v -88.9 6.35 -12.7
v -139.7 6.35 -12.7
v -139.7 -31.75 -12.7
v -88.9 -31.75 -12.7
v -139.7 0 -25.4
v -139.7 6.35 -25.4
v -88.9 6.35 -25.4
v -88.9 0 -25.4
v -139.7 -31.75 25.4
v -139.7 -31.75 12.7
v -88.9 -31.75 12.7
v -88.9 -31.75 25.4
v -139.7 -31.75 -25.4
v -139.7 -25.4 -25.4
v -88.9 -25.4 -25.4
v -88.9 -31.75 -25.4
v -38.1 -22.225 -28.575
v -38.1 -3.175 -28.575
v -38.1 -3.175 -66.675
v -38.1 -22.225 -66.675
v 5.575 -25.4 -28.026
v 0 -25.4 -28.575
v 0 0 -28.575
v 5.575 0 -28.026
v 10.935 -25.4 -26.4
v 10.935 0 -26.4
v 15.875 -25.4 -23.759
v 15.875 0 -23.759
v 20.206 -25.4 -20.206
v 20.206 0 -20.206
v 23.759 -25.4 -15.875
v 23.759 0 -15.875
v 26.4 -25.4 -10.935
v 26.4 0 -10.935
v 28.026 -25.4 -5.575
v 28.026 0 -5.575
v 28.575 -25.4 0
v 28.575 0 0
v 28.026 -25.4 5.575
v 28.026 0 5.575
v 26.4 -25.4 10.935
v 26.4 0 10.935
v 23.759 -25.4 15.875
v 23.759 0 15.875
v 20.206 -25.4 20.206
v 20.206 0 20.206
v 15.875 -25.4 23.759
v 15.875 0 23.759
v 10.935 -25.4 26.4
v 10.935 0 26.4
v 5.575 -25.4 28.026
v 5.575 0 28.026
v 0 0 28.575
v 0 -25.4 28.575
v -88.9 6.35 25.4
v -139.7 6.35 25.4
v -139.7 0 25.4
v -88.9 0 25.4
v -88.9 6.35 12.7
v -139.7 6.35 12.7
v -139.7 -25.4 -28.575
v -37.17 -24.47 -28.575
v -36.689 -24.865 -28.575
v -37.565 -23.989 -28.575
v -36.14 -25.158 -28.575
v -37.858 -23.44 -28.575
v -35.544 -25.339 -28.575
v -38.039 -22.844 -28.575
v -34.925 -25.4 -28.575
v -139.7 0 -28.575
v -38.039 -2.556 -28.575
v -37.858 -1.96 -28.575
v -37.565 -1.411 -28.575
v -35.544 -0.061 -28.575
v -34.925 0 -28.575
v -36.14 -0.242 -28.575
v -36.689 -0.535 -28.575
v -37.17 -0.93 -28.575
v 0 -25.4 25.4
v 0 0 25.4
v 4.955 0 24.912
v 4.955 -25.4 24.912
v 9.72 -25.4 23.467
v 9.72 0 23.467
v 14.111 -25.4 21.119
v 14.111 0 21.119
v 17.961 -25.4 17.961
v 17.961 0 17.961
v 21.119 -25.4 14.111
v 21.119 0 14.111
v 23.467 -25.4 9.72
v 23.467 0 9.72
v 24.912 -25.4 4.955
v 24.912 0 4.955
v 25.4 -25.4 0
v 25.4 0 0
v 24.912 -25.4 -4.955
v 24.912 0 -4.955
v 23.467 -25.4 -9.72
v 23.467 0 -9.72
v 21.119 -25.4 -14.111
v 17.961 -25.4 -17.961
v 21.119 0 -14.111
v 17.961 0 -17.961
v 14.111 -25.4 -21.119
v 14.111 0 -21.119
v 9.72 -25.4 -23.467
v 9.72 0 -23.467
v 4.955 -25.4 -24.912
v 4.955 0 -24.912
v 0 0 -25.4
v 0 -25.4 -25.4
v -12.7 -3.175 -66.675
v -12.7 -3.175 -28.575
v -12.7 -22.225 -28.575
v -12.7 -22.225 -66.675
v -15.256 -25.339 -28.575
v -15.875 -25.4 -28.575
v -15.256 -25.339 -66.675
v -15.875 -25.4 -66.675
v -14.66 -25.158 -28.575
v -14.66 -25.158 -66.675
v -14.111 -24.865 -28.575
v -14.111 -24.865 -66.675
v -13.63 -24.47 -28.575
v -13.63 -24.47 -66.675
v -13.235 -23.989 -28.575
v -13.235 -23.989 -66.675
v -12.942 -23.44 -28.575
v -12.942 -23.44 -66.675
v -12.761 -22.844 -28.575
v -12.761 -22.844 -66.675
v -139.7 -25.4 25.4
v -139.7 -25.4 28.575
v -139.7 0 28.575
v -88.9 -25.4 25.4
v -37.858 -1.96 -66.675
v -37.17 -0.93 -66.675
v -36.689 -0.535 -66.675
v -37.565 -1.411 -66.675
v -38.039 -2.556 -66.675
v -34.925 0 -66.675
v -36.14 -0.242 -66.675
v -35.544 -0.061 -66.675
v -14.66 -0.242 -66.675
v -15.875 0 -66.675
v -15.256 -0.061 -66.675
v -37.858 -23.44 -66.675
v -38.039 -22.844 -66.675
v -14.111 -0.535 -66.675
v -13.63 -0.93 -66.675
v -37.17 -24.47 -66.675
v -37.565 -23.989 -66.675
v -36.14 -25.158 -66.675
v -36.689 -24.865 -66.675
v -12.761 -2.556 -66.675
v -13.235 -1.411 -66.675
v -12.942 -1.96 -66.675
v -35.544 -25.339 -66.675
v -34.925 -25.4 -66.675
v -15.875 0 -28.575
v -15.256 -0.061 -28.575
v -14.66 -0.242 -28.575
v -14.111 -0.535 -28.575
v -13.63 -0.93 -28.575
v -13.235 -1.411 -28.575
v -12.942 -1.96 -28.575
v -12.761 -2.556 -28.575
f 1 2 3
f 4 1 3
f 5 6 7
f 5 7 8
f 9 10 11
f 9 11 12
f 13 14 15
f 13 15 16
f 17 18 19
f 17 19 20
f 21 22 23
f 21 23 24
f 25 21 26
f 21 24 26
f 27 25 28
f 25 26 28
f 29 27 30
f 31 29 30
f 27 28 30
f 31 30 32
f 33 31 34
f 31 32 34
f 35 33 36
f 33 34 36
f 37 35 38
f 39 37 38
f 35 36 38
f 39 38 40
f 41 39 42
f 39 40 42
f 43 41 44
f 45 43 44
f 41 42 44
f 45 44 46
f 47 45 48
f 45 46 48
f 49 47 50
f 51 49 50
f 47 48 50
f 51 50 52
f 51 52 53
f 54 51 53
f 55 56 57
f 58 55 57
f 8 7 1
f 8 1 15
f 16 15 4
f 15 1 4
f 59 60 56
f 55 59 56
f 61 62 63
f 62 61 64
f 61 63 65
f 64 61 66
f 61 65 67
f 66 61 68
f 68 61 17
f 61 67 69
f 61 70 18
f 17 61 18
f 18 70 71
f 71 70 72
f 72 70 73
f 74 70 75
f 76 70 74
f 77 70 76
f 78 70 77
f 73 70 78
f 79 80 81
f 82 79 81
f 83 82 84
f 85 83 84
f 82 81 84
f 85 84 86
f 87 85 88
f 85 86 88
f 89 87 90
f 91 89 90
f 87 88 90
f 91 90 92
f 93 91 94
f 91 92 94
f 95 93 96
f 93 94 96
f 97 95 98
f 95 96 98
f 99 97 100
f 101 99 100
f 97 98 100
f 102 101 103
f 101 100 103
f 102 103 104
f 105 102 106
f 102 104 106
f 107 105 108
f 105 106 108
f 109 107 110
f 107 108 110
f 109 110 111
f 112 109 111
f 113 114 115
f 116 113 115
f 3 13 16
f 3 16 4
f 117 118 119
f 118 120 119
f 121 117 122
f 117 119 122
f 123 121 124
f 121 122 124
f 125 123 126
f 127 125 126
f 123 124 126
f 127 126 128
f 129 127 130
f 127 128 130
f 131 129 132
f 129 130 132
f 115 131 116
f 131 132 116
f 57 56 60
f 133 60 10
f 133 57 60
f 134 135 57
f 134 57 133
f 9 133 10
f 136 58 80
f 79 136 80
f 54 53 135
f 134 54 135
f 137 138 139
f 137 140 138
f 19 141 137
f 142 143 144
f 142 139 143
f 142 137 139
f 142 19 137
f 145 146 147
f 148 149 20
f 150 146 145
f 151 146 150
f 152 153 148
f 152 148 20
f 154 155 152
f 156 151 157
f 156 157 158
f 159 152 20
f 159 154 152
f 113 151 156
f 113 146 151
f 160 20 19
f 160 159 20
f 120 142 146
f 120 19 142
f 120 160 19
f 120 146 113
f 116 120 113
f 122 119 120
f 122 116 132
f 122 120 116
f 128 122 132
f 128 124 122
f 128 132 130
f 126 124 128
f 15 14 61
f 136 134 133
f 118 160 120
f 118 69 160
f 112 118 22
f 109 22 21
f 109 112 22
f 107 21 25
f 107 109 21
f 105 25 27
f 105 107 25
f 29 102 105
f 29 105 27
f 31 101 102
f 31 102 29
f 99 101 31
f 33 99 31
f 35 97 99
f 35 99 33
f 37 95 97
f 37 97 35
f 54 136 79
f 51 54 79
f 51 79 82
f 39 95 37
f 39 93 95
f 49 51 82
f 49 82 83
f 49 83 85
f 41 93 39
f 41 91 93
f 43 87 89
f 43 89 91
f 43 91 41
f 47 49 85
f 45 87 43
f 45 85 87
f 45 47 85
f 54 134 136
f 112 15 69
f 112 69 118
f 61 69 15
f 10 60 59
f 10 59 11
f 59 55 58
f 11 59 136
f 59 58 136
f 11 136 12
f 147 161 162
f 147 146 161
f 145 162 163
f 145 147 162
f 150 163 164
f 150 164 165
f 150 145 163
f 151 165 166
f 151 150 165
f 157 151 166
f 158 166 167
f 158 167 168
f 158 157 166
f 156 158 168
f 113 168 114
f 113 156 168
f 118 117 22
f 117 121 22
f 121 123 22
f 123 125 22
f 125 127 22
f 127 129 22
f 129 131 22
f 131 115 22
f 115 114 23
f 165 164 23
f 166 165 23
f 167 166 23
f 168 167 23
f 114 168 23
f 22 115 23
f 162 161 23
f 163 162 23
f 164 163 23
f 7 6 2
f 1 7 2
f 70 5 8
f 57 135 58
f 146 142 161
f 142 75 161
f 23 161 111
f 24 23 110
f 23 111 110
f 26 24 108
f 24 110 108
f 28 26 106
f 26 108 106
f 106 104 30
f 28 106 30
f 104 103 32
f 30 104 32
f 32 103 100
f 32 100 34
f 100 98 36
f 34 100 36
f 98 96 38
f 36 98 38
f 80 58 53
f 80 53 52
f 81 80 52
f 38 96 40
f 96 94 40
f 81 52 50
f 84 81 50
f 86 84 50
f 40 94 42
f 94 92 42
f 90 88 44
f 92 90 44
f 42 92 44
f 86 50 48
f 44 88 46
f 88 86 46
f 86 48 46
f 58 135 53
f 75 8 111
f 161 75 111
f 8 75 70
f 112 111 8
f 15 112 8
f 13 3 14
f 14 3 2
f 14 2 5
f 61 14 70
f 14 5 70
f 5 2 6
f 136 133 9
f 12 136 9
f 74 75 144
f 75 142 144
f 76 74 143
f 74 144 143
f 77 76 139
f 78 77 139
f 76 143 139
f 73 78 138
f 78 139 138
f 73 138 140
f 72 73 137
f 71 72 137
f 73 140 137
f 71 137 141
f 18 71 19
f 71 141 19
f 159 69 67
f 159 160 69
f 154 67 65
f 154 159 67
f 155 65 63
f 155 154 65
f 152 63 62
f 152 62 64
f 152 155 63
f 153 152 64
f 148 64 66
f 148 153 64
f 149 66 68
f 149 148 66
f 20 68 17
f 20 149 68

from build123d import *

# Parameters (mm, degrees)
F1_DEPTH = 25.4
F2_W     = 38.1
F2_H     = 12.7
F3_DEPTH = 50.8
F4_W     = 25.4
F4_H     = 25.4
F5_DEPTH = 38.1
F6_R     = 3.175


with BuildPart() as f1:
    # F0 (on Front) → F1 (new body)
    with BuildSketch(Plane.XZ):
        with BuildLine():
            ThreePointArc((0, 25.4), (25.4, 0), (0, -25.4))
            Line((0, -25.4), (-139.7, -25.4))
            Line((-139.7, -25.4), (-139.7, -28.575))
            Line((-139.7, -28.575), (0, -28.575))
            ThreePointArc((0, -28.575), (28.575, 0), (0, 28.575))
            Line((0, 28.575), (-139.7, 28.575))
            Line((-139.7, 28.575), (-139.7, 25.4))
            Line((-139.7, 25.4), (0, 25.4))
        make_face()
    extrude(amount=F1_DEPTH)

    # F2 (on face) → F3 (join)
    with BuildSketch(Plane(origin=(-139.7, 0, 0), x_dir=(0, -1, 0), z_dir=(-1, 0, 0))):
        with Locations((12.7, 19.05)):
            Rectangle(F2_W, F2_H)
        with Locations((12.7, -19.05)):
            Rectangle(F2_W, F2_H)
    extrude(amount=-F3_DEPTH)

    # F4 (on face) → F5 (join)
    with BuildSketch(Plane(origin=(0, 0, -28.575), x_dir=(1, 0, 0), z_dir=(0, 0, -1))):
        with Locations((-25.4, 12.7)):
            Rectangle(F4_W, F4_H)
    extrude(amount=F5_DEPTH)

    # F6
    f6_edges = [f1.edges().sort_by_distance(p)[0] for p in [
        (-38.1, -25.4, -47.625),
        (-38.1, 0, -47.625),
        (-12.7, -25.4, -47.625),
        (-12.7, 0, -47.625),
    ]]
    fillet(f6_edges, radius=F6_R)


solid = f1.part
